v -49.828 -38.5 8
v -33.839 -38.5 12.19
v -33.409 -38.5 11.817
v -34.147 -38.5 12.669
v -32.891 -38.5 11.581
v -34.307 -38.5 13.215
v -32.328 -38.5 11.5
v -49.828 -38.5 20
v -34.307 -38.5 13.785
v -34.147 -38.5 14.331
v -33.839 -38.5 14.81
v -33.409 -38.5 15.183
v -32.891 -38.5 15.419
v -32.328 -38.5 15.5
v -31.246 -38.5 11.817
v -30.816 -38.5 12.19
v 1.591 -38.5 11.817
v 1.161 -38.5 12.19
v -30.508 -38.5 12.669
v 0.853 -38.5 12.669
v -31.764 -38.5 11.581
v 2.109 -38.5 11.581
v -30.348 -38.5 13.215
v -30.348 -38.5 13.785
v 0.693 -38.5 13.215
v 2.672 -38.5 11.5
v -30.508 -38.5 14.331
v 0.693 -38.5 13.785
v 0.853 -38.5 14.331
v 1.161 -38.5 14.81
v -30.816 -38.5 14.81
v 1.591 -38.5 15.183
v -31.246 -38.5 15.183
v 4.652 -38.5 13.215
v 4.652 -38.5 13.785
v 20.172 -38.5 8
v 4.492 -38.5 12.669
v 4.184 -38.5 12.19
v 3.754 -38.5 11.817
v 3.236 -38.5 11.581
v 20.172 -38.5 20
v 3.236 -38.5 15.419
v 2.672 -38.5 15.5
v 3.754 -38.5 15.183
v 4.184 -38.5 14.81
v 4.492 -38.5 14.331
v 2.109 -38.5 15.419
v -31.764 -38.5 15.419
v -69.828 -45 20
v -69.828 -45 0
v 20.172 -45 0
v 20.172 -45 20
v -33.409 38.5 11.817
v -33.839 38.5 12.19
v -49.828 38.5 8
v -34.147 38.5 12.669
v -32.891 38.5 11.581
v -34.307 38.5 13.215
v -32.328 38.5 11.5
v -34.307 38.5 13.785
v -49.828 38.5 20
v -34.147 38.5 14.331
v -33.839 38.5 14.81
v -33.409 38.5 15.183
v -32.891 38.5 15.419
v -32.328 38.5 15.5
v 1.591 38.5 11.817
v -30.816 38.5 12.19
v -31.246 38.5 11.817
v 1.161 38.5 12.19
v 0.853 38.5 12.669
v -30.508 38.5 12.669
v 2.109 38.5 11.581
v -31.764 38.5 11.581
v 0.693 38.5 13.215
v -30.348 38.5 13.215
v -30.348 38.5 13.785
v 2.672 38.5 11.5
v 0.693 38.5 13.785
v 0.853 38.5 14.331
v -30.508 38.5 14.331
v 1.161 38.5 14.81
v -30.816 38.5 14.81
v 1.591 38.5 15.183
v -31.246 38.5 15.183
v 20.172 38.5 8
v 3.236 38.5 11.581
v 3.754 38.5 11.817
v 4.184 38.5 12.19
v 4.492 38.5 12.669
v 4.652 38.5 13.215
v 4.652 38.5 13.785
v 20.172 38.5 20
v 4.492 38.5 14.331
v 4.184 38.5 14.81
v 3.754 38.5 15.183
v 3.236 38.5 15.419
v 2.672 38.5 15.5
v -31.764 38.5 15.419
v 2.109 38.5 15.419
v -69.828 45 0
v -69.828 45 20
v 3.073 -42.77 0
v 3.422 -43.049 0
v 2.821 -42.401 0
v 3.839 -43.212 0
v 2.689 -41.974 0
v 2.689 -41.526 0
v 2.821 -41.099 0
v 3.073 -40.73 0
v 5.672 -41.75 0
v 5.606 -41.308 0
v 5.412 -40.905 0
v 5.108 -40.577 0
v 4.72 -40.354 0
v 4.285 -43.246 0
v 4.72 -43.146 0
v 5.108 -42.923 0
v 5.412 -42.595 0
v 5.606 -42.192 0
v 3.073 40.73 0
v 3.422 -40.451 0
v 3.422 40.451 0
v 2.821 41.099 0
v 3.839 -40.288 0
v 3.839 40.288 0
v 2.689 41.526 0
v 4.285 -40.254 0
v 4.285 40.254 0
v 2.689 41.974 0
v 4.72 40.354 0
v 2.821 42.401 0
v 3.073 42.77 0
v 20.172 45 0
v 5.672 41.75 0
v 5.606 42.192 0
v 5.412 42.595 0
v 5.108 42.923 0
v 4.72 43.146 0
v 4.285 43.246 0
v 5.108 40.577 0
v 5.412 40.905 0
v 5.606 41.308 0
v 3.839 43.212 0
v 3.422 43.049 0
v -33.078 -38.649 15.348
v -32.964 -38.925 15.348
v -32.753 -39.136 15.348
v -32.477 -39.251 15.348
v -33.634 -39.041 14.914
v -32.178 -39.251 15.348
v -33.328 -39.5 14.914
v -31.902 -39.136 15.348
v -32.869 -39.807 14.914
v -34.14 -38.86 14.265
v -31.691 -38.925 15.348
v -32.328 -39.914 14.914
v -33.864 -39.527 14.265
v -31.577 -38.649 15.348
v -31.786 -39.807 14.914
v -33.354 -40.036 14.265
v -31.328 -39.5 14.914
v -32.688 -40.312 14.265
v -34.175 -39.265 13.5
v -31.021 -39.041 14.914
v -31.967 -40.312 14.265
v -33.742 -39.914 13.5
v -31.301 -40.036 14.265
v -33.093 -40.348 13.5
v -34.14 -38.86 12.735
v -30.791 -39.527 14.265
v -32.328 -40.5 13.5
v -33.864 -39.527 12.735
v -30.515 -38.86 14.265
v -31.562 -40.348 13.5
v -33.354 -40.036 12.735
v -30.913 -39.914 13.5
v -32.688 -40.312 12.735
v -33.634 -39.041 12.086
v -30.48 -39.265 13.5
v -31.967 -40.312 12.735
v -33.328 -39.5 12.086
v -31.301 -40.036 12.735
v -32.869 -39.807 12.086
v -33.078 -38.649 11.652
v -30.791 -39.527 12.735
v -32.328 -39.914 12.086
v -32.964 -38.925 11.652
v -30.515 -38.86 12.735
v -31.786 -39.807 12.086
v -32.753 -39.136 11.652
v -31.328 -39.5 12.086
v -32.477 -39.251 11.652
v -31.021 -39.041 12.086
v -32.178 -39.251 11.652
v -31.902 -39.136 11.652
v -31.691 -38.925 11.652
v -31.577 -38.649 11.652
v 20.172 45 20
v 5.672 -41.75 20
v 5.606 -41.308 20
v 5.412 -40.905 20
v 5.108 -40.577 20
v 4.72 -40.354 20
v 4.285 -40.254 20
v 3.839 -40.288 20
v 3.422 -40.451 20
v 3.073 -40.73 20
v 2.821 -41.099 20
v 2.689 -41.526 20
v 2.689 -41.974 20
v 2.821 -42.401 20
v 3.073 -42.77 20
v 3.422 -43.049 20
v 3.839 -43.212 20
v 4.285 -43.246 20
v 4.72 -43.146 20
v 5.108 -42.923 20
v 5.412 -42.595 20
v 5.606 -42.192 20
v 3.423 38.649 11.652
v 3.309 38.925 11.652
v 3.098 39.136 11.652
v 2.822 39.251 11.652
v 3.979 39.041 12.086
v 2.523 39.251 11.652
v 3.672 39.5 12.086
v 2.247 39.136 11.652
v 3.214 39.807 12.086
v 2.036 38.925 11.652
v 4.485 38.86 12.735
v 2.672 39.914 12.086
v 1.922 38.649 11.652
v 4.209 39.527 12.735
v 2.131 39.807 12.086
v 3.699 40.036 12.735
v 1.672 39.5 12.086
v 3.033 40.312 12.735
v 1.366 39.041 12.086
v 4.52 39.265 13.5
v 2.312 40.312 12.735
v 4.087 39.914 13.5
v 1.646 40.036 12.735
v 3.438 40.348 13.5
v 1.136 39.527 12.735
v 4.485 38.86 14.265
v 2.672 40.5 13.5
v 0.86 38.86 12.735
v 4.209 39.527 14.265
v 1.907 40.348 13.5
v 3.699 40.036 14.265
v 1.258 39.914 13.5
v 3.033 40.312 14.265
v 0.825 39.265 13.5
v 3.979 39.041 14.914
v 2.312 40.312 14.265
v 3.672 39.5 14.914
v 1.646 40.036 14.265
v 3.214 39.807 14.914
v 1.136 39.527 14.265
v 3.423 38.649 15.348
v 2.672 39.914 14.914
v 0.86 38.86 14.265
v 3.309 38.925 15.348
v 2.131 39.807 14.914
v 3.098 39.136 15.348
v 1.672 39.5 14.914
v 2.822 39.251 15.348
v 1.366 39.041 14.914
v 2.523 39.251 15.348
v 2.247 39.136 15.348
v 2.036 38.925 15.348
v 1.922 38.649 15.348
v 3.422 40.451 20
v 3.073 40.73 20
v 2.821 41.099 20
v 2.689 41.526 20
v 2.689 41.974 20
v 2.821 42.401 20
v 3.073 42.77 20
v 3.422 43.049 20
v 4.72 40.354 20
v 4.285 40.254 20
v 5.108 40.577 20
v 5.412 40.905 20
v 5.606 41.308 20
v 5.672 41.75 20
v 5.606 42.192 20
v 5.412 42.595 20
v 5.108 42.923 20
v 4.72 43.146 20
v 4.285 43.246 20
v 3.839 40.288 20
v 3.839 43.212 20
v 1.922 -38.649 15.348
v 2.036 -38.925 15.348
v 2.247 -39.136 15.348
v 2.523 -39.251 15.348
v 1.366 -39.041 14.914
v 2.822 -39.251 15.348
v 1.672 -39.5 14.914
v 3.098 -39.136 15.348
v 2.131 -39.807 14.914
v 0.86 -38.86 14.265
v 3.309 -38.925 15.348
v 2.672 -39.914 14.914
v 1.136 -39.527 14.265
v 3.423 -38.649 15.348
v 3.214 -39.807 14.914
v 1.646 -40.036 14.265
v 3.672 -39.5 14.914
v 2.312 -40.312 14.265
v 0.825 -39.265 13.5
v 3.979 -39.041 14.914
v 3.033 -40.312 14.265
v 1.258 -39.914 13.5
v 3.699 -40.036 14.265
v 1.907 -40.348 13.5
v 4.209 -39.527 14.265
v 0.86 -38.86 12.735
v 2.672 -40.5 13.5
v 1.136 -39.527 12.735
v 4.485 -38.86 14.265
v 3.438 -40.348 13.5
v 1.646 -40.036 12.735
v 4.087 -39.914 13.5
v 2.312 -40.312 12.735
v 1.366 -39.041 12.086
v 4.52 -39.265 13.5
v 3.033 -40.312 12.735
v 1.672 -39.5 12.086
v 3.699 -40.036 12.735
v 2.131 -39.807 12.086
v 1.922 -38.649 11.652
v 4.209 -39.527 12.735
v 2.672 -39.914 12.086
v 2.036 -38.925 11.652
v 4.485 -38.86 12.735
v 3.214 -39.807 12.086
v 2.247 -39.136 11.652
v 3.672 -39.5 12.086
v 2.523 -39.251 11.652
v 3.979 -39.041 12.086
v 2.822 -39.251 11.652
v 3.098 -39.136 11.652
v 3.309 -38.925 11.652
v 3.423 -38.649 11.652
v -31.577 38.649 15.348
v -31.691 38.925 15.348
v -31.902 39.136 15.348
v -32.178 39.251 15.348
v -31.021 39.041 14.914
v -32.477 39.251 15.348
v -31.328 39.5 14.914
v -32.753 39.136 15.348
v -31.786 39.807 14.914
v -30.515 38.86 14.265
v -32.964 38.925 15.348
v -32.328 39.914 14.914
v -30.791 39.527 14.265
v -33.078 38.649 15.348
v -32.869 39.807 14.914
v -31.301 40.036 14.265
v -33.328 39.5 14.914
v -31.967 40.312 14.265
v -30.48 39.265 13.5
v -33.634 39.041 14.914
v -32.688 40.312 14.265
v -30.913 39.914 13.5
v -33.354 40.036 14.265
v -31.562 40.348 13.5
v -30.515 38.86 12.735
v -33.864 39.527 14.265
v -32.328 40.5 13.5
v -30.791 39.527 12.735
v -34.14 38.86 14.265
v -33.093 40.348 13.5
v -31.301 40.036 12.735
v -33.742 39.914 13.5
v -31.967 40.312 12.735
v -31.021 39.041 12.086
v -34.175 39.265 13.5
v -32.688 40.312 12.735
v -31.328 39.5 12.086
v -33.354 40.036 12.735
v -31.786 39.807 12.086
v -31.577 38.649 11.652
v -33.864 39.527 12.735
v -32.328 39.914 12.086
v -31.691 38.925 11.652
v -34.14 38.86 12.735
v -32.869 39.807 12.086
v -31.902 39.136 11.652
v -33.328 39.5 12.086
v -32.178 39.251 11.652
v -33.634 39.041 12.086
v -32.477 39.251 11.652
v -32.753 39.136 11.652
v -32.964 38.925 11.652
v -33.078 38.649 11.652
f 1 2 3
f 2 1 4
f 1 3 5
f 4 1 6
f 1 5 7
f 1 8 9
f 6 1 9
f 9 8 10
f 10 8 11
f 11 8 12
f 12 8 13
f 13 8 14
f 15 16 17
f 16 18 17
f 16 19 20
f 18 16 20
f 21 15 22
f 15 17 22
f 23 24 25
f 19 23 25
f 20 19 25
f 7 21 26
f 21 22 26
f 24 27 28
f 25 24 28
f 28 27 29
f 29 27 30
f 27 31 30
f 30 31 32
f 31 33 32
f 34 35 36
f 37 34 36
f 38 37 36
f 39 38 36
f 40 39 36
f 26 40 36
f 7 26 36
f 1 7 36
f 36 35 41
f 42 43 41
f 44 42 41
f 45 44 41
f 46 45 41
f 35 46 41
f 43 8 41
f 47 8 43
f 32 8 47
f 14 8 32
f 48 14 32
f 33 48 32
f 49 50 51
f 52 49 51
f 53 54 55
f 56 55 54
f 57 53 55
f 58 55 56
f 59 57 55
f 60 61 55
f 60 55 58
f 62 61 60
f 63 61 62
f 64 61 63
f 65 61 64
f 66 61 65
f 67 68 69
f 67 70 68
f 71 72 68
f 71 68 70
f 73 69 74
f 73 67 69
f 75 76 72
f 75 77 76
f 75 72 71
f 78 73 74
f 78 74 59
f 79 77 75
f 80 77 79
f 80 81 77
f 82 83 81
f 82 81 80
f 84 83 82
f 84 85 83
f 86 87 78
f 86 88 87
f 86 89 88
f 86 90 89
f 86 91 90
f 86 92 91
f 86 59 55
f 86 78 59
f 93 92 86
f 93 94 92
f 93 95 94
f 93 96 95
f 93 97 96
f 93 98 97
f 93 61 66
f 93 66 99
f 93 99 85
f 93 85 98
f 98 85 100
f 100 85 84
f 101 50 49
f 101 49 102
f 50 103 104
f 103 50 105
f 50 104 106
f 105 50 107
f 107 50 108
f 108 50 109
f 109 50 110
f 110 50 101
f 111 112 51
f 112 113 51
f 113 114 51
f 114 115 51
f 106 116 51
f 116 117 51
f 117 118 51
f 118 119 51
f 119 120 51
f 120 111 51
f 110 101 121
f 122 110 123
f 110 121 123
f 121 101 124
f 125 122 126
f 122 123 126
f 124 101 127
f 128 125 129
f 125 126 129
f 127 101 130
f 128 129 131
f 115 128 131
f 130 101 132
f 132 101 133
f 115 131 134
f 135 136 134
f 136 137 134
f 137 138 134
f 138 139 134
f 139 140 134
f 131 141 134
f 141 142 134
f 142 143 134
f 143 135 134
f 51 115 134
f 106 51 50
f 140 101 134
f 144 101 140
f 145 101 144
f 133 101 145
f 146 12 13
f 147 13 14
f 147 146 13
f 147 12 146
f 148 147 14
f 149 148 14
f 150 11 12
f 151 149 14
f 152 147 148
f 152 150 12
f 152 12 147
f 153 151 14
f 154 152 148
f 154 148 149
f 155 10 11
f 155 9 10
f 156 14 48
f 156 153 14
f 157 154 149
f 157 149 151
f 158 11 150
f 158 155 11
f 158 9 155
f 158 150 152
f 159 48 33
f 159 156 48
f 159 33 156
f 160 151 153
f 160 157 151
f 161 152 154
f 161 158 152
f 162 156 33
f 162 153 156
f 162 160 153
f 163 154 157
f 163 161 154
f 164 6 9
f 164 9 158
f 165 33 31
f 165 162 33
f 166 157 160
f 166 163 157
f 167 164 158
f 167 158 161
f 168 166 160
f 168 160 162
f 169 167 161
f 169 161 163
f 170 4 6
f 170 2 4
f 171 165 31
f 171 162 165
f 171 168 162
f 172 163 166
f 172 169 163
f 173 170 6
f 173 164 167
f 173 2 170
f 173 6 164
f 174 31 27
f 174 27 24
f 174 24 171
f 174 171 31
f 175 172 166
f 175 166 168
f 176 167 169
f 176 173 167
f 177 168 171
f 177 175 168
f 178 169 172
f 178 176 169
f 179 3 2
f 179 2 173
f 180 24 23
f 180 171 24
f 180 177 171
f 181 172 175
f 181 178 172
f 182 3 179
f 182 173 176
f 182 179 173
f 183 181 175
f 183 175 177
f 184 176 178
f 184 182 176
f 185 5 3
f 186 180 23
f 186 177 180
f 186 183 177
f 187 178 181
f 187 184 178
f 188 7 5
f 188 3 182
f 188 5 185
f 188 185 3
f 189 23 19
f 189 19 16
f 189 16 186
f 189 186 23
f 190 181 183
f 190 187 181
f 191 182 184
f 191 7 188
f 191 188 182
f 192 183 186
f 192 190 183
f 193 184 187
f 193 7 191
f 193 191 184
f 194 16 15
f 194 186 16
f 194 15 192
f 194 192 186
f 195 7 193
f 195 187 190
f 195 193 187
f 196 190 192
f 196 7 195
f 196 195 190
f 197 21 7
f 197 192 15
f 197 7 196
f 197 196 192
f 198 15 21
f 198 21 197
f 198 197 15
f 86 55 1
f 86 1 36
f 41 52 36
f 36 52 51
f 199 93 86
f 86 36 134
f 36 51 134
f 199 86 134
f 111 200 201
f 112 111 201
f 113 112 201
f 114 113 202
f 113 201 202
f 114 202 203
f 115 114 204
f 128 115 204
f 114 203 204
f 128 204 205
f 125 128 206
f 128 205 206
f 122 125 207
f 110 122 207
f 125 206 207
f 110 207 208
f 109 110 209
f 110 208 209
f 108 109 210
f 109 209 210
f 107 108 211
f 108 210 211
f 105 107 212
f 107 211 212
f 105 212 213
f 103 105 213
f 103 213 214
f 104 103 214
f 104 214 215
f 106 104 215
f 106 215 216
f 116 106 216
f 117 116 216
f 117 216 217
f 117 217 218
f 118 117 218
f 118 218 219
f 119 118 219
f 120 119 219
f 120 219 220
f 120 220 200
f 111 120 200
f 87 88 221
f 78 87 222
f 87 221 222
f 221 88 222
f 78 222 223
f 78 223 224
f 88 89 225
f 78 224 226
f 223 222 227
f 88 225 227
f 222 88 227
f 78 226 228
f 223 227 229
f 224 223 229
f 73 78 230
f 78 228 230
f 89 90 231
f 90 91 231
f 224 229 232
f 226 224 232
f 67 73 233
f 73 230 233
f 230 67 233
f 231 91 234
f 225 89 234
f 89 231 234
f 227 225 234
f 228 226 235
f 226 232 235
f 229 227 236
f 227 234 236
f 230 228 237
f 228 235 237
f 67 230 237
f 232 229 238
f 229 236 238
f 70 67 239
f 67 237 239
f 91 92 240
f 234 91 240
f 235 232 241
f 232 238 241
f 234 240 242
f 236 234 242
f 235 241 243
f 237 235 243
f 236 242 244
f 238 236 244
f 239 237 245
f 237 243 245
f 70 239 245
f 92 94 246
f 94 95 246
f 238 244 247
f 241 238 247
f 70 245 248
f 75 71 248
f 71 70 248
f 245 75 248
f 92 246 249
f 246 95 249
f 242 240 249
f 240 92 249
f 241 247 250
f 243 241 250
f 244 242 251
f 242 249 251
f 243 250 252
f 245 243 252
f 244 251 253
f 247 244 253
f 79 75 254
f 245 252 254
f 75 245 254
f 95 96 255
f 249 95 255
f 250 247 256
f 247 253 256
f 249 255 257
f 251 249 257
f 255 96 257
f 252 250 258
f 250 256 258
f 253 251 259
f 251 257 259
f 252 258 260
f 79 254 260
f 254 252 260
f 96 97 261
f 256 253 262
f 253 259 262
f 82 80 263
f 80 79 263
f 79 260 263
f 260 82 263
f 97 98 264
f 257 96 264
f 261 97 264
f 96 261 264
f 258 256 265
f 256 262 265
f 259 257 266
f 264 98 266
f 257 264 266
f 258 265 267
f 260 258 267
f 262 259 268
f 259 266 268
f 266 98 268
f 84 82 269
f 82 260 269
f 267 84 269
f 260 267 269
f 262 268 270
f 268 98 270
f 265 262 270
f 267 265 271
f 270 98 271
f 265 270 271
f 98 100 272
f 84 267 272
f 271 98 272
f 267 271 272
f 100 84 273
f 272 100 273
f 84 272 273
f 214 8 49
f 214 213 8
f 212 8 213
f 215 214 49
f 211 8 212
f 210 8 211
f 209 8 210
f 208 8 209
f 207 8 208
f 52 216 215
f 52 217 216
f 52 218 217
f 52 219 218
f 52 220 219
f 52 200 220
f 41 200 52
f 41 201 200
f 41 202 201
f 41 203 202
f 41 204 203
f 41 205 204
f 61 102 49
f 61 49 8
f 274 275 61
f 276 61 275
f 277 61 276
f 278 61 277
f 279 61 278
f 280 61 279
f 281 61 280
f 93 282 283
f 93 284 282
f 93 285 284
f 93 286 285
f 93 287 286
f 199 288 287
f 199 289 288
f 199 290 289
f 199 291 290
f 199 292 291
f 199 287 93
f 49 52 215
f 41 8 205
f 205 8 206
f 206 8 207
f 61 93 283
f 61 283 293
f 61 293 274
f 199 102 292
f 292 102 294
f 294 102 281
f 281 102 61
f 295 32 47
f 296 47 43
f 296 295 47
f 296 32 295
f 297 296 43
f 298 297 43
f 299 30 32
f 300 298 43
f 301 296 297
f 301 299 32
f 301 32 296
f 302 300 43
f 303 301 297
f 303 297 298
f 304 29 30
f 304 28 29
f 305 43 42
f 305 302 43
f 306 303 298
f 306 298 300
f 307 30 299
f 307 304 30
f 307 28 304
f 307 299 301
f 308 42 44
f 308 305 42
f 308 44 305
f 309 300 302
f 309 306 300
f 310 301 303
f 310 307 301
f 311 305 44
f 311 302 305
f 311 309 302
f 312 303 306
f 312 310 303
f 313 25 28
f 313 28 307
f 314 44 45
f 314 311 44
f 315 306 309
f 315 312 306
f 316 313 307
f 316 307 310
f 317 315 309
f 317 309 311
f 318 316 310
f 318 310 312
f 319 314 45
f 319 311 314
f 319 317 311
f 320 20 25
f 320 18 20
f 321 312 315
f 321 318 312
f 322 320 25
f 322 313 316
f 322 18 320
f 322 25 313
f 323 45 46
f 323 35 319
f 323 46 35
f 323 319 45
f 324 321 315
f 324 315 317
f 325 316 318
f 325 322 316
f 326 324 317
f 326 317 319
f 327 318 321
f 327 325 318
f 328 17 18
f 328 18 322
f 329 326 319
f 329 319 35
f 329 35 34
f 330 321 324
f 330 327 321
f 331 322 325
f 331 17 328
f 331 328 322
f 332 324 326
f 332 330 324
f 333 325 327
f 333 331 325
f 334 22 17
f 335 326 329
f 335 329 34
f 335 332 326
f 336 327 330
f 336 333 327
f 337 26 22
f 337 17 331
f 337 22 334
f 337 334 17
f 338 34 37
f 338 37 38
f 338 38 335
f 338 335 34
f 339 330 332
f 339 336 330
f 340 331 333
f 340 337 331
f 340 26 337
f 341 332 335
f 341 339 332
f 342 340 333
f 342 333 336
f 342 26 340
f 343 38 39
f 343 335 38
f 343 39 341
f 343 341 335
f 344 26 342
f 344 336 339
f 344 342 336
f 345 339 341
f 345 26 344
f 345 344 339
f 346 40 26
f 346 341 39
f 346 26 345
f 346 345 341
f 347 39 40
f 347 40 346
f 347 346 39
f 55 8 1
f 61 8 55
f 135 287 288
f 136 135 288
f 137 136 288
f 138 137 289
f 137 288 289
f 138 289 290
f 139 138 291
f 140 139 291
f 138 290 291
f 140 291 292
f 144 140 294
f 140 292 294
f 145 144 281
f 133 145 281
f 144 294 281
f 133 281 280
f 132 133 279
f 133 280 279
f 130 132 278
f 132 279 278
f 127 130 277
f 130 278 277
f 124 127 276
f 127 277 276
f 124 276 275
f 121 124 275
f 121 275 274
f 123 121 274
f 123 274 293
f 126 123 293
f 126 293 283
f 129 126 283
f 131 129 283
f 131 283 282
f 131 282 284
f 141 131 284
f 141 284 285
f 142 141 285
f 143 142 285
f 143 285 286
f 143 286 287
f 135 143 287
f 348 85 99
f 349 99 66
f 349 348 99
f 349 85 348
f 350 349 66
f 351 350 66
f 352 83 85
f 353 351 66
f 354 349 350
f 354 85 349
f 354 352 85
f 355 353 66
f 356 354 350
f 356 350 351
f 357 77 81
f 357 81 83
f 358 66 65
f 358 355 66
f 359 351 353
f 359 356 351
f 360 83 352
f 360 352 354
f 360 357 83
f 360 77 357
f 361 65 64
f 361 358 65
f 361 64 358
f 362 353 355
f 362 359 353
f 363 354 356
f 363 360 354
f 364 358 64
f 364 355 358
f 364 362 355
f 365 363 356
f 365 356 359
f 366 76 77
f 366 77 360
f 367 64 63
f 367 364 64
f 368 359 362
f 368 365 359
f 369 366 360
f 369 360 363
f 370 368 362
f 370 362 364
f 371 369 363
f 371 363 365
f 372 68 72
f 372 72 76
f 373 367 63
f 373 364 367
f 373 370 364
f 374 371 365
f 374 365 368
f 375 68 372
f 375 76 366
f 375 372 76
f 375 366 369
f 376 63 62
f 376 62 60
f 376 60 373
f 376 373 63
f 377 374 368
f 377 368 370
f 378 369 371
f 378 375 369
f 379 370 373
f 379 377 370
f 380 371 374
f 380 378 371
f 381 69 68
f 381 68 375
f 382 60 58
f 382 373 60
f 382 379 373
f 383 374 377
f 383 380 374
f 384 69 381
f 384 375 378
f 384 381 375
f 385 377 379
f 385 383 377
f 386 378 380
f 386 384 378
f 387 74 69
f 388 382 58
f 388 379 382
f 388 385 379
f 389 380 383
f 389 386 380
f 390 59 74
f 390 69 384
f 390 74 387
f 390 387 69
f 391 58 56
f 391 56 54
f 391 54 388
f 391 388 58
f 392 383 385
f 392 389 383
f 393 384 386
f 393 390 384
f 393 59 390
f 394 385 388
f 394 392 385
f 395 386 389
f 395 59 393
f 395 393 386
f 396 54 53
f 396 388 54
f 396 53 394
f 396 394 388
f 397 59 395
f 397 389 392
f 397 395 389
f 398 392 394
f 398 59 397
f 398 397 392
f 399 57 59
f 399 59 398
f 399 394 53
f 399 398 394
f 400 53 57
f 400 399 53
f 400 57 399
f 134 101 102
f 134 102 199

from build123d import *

# Parameters (mm, degrees)
F0_W      = 90
F0_H      = 90
F1_DEPTH  = 20
F2_W      = 70
F2_H      = 77
F3_DEPTH  = 12
F12_R     = 1.5
F13_DEPTH = 25


with BuildPart() as f1:
    # F0 (on Top) → F1 (new body)
    with BuildSketch(Plane.XY):
        with Locations((-24.827586, 0)):
            Rectangle(F0_W, F0_H)
    extrude(amount=F1_DEPTH)

    # F2 (on face) → F3 (cut)
    with BuildSketch(Plane.XY.offset(20)):
        with Locations((-14.827586, 0)):
            Rectangle(F2_W, F2_H)
    extrude(amount=-F3_DEPTH, mode=Mode.SUBTRACT)

    # F4 (on face) → F5 (revolve, cut)
    with BuildSketch(Plane(origin=(0, -38.5, 0), x_dir=(-1, 0, 0), z_dir=(0, 1, 0))):
        with BuildLine():
            Line((32.327586, 11.5), (32.327586, 15.5))
            ThreePointArc((32.327586, 15.5), (30.327586, 13.5), (32.327586, 11.5))
        make_face()
    revolve(axis=Axis((-32.327586, -38.5, 13.5), (0, 0, 1)), mode=Mode.SUBTRACT)

    # F6 (on face) → F7 (revolve, cut)
    with BuildSketch(Plane(origin=(0, -38.5, 0), x_dir=(-1, 0, 0), z_dir=(0, 1, 0))):
        with BuildLine():
            Line((-2.672414, 11.5), (-2.672414, 15.5))
            ThreePointArc((-2.672414, 15.5), (-4.672414, 13.5), (-2.672414, 11.5))
        make_face()
    revolve(axis=Axis((2.672414, -38.5, 13.5), (0, 0, 1)), mode=Mode.SUBTRACT)

    # F8 (on face) → F9 (revolve, cut)
    with BuildSketch(Plane.XZ.offset(-38.5)):
        with BuildLine():
            Line((2.672414, 15.5), (2.672414, 11.5))
            ThreePointArc((2.672414, 11.5), (4.672414, 13.5), (2.672414, 15.5))
        make_face()
    revolve(axis=Axis((2.672414, 38.5, 13.5), (0, 0, 1)), mode=Mode.SUBTRACT)

    # F10 (on face) → F11 (revolve, cut)
    with BuildSketch(Plane.XZ.offset(-38.5)):
        with BuildLine():
            Line((-32.327586, 11.5), (-32.327586, 15.5))
            ThreePointArc((-32.327586, 15.5), (-34.327586, 13.5), (-32.327586, 11.5))
        make_face()
    revolve(axis=Axis((-32.327586, 38.5, 13.5), (0, 0, 1)), mode=Mode.SUBTRACT)

    # F12 (on face) → F13 (cut)
    with BuildSketch(Plane.XY.offset(20)):
        with Locations((4.172414, -41.75)):
            Circle(F12_R)
        with Locations((4.172414, 41.75)):
            Circle(F12_R)
    extrude(amount=-F13_DEPTH, mode=Mode.SUBTRACT)


solid = f1.part
